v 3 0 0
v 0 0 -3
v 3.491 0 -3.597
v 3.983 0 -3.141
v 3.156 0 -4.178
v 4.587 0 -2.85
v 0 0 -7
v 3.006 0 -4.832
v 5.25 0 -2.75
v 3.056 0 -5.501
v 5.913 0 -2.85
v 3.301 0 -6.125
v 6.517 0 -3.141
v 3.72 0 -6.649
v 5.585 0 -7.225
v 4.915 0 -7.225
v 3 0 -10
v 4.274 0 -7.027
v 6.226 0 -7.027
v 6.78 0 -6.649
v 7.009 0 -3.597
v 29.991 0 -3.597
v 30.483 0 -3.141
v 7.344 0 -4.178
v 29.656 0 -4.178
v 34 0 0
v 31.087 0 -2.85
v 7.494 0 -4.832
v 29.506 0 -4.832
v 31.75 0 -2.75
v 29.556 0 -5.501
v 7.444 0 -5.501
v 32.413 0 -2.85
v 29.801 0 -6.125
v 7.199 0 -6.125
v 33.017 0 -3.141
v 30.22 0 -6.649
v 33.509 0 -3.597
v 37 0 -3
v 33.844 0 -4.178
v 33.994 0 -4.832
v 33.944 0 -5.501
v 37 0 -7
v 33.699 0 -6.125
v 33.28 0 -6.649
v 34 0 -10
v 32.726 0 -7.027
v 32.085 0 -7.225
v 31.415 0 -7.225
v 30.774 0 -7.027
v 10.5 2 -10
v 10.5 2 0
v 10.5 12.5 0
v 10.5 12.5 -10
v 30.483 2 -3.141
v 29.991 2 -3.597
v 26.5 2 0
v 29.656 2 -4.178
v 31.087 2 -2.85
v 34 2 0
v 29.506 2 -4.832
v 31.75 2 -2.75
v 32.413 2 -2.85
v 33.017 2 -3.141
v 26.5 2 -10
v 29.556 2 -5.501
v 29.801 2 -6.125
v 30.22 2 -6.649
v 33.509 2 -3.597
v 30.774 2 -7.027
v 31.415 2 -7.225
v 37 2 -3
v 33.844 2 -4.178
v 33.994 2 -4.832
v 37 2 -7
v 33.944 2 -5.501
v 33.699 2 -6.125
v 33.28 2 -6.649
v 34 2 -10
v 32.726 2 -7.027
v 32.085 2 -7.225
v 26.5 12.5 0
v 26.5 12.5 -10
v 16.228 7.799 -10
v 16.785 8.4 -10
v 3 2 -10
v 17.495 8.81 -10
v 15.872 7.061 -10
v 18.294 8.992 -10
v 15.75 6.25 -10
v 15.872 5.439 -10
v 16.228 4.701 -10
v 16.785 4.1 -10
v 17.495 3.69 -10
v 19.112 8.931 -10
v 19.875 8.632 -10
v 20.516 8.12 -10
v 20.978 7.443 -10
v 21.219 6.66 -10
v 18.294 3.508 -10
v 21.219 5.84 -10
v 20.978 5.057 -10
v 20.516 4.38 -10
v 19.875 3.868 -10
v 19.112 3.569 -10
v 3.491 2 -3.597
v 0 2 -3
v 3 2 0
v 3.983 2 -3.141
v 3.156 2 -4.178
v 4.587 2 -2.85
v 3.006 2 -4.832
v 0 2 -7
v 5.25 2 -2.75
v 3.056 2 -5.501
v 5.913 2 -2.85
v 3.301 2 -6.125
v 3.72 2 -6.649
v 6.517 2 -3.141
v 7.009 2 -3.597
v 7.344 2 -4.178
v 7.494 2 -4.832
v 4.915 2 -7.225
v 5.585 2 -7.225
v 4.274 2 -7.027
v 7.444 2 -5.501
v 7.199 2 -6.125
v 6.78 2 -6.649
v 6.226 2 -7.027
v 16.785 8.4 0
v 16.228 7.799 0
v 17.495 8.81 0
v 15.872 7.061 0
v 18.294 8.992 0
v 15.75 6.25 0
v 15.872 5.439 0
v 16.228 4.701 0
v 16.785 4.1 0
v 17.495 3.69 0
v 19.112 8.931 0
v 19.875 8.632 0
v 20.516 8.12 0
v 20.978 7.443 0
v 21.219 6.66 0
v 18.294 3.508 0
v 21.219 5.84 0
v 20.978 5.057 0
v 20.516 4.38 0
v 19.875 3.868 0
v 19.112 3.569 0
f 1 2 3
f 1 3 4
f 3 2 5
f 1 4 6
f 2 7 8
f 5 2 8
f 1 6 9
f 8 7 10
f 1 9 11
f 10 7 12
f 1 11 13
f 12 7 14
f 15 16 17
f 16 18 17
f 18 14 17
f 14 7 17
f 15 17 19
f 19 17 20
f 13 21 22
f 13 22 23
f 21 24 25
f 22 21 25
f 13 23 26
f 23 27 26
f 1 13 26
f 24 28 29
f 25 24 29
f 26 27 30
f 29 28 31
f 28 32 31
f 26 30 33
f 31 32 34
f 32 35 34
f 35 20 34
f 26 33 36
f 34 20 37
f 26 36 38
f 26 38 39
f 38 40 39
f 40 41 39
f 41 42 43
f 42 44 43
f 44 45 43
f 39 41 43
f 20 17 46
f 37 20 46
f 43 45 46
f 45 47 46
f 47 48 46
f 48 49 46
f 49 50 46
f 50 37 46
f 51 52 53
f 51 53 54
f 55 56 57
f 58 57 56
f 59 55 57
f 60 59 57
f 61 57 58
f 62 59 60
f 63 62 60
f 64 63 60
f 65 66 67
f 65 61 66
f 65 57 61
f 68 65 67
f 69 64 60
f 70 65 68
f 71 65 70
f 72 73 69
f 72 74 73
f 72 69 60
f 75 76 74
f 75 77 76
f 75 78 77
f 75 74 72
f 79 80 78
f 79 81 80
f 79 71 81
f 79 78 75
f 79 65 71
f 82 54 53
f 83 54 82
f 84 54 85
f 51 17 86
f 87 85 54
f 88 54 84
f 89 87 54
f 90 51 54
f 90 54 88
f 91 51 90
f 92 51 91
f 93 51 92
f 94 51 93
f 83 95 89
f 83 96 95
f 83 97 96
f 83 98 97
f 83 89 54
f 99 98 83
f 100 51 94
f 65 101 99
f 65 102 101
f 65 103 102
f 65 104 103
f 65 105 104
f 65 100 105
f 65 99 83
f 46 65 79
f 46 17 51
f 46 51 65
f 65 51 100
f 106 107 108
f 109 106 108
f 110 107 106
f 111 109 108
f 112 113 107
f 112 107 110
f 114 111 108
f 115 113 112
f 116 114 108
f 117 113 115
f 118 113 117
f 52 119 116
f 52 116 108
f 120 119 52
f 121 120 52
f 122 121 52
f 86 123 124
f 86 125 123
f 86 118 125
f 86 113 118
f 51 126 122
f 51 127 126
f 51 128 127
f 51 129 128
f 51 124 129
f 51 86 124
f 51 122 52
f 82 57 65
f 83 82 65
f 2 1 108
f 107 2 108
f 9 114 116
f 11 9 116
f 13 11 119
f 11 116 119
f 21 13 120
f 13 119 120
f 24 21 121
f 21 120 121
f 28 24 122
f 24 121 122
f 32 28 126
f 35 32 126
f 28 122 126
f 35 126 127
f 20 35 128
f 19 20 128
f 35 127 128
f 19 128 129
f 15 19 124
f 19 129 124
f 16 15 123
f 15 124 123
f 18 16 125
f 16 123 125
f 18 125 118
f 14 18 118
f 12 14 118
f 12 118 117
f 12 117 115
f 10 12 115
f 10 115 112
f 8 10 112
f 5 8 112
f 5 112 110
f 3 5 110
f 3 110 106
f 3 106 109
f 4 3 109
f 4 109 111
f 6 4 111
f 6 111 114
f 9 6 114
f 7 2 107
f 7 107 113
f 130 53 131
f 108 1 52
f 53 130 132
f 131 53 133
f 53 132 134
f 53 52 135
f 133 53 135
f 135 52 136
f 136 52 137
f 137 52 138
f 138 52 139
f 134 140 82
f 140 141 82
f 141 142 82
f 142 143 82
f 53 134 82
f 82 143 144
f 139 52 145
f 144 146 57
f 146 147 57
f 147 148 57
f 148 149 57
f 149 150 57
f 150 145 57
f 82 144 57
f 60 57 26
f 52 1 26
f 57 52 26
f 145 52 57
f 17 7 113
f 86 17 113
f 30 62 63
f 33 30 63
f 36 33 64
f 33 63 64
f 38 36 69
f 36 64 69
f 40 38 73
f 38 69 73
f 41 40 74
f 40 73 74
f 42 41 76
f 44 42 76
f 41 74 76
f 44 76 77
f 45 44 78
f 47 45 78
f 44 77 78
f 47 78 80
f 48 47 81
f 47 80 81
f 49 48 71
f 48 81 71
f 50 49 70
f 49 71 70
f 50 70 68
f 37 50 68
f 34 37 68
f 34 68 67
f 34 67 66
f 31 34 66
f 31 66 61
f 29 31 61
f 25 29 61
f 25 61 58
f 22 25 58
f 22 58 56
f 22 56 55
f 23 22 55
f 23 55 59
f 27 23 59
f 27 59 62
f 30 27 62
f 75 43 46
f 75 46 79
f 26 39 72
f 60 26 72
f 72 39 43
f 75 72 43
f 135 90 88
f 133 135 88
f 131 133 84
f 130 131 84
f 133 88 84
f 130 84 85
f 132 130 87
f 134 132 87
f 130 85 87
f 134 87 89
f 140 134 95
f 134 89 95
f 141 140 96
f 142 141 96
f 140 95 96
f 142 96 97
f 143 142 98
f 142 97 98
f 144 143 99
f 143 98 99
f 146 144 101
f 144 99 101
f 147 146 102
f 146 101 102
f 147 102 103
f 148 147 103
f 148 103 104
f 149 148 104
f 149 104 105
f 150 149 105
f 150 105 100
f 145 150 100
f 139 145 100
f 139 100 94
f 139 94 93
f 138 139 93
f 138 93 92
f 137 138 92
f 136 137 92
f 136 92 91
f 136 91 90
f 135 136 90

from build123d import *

# Parameters (mm, degrees)
SKETCH1_W           = 37
SKETCH1_H           = 10
BOSS_EXTRUDE1_DEPTH = 2
SKETCH2_W           = 16
SKETCH2_H           = 10
BOSS_EXTRUDE2_DEPTH = 10.5
SKETCH3_R           = 2.75
CUT_EXTRUDE1_DEPTH  = 41.314389491
SKETCH4_R           = 2.25
CUT_EXTRUDE2_DEPTH  = 10
CHAMFER1_SIZE       = 3


with BuildPart() as part:
    # Sketch1 → Boss-Extrude1 (new body)
    with BuildSketch(Plane(origin=(0, 0, 0), x_dir=(1, 0, 0), z_dir=(0, 1, 0))):
        with Locations((18.5, 5)):
            Rectangle(SKETCH1_W, SKETCH1_H)
    extrude(amount=BOSS_EXTRUDE1_DEPTH)

    # Sketch2 → Boss-Extrude2 (add)
    with BuildSketch(Plane(origin=(0, 2, 0), x_dir=(1, 0, 0), z_dir=(0, 1, 0))):
        with Locations((18.5, 5)):
            Rectangle(SKETCH2_W, SKETCH2_H)
    extrude(amount=BOSS_EXTRUDE2_DEPTH)

    # Sketch3 → Cut-Extrude1 (cut, through all)
    with BuildSketch(Plane(origin=(0, 0, -10), x_dir=(-1, 0, 0), z_dir=(0, 0, -1))):
        with Locations((-18.5, 6.25)):
            Circle(SKETCH3_R)
    extrude(amount=-CUT_EXTRUDE1_DEPTH, mode=Mode.SUBTRACT)

    # Sketch4 → Cut-Extrude2 (cut)
    with BuildSketch(Plane(origin=(0, 2, 0), x_dir=(1, 0, 0), z_dir=(0, 1, 0))):
        with Locations(Location((5.25, 5, 0), (0, 0, 270))):
            Circle(SKETCH4_R)
        with Locations(Location((31.75, 5, 0), (0, 0, 270))):
            Circle(SKETCH4_R)
    extrude(amount=-CUT_EXTRUDE2_DEPTH, mode=Mode.SUBTRACT)

    # Chamfer1
    chamfer1_edges = [part.edges().sort_by_distance(p)[0] for p in [
        (0, 1, -10),
        (37, 1, -10),
        (37, 1, 0),
        (0, 1, 0),
    ]]
    chamfer(chamfer1_edges, length=CHAMFER1_SIZE)


solid = part.part
